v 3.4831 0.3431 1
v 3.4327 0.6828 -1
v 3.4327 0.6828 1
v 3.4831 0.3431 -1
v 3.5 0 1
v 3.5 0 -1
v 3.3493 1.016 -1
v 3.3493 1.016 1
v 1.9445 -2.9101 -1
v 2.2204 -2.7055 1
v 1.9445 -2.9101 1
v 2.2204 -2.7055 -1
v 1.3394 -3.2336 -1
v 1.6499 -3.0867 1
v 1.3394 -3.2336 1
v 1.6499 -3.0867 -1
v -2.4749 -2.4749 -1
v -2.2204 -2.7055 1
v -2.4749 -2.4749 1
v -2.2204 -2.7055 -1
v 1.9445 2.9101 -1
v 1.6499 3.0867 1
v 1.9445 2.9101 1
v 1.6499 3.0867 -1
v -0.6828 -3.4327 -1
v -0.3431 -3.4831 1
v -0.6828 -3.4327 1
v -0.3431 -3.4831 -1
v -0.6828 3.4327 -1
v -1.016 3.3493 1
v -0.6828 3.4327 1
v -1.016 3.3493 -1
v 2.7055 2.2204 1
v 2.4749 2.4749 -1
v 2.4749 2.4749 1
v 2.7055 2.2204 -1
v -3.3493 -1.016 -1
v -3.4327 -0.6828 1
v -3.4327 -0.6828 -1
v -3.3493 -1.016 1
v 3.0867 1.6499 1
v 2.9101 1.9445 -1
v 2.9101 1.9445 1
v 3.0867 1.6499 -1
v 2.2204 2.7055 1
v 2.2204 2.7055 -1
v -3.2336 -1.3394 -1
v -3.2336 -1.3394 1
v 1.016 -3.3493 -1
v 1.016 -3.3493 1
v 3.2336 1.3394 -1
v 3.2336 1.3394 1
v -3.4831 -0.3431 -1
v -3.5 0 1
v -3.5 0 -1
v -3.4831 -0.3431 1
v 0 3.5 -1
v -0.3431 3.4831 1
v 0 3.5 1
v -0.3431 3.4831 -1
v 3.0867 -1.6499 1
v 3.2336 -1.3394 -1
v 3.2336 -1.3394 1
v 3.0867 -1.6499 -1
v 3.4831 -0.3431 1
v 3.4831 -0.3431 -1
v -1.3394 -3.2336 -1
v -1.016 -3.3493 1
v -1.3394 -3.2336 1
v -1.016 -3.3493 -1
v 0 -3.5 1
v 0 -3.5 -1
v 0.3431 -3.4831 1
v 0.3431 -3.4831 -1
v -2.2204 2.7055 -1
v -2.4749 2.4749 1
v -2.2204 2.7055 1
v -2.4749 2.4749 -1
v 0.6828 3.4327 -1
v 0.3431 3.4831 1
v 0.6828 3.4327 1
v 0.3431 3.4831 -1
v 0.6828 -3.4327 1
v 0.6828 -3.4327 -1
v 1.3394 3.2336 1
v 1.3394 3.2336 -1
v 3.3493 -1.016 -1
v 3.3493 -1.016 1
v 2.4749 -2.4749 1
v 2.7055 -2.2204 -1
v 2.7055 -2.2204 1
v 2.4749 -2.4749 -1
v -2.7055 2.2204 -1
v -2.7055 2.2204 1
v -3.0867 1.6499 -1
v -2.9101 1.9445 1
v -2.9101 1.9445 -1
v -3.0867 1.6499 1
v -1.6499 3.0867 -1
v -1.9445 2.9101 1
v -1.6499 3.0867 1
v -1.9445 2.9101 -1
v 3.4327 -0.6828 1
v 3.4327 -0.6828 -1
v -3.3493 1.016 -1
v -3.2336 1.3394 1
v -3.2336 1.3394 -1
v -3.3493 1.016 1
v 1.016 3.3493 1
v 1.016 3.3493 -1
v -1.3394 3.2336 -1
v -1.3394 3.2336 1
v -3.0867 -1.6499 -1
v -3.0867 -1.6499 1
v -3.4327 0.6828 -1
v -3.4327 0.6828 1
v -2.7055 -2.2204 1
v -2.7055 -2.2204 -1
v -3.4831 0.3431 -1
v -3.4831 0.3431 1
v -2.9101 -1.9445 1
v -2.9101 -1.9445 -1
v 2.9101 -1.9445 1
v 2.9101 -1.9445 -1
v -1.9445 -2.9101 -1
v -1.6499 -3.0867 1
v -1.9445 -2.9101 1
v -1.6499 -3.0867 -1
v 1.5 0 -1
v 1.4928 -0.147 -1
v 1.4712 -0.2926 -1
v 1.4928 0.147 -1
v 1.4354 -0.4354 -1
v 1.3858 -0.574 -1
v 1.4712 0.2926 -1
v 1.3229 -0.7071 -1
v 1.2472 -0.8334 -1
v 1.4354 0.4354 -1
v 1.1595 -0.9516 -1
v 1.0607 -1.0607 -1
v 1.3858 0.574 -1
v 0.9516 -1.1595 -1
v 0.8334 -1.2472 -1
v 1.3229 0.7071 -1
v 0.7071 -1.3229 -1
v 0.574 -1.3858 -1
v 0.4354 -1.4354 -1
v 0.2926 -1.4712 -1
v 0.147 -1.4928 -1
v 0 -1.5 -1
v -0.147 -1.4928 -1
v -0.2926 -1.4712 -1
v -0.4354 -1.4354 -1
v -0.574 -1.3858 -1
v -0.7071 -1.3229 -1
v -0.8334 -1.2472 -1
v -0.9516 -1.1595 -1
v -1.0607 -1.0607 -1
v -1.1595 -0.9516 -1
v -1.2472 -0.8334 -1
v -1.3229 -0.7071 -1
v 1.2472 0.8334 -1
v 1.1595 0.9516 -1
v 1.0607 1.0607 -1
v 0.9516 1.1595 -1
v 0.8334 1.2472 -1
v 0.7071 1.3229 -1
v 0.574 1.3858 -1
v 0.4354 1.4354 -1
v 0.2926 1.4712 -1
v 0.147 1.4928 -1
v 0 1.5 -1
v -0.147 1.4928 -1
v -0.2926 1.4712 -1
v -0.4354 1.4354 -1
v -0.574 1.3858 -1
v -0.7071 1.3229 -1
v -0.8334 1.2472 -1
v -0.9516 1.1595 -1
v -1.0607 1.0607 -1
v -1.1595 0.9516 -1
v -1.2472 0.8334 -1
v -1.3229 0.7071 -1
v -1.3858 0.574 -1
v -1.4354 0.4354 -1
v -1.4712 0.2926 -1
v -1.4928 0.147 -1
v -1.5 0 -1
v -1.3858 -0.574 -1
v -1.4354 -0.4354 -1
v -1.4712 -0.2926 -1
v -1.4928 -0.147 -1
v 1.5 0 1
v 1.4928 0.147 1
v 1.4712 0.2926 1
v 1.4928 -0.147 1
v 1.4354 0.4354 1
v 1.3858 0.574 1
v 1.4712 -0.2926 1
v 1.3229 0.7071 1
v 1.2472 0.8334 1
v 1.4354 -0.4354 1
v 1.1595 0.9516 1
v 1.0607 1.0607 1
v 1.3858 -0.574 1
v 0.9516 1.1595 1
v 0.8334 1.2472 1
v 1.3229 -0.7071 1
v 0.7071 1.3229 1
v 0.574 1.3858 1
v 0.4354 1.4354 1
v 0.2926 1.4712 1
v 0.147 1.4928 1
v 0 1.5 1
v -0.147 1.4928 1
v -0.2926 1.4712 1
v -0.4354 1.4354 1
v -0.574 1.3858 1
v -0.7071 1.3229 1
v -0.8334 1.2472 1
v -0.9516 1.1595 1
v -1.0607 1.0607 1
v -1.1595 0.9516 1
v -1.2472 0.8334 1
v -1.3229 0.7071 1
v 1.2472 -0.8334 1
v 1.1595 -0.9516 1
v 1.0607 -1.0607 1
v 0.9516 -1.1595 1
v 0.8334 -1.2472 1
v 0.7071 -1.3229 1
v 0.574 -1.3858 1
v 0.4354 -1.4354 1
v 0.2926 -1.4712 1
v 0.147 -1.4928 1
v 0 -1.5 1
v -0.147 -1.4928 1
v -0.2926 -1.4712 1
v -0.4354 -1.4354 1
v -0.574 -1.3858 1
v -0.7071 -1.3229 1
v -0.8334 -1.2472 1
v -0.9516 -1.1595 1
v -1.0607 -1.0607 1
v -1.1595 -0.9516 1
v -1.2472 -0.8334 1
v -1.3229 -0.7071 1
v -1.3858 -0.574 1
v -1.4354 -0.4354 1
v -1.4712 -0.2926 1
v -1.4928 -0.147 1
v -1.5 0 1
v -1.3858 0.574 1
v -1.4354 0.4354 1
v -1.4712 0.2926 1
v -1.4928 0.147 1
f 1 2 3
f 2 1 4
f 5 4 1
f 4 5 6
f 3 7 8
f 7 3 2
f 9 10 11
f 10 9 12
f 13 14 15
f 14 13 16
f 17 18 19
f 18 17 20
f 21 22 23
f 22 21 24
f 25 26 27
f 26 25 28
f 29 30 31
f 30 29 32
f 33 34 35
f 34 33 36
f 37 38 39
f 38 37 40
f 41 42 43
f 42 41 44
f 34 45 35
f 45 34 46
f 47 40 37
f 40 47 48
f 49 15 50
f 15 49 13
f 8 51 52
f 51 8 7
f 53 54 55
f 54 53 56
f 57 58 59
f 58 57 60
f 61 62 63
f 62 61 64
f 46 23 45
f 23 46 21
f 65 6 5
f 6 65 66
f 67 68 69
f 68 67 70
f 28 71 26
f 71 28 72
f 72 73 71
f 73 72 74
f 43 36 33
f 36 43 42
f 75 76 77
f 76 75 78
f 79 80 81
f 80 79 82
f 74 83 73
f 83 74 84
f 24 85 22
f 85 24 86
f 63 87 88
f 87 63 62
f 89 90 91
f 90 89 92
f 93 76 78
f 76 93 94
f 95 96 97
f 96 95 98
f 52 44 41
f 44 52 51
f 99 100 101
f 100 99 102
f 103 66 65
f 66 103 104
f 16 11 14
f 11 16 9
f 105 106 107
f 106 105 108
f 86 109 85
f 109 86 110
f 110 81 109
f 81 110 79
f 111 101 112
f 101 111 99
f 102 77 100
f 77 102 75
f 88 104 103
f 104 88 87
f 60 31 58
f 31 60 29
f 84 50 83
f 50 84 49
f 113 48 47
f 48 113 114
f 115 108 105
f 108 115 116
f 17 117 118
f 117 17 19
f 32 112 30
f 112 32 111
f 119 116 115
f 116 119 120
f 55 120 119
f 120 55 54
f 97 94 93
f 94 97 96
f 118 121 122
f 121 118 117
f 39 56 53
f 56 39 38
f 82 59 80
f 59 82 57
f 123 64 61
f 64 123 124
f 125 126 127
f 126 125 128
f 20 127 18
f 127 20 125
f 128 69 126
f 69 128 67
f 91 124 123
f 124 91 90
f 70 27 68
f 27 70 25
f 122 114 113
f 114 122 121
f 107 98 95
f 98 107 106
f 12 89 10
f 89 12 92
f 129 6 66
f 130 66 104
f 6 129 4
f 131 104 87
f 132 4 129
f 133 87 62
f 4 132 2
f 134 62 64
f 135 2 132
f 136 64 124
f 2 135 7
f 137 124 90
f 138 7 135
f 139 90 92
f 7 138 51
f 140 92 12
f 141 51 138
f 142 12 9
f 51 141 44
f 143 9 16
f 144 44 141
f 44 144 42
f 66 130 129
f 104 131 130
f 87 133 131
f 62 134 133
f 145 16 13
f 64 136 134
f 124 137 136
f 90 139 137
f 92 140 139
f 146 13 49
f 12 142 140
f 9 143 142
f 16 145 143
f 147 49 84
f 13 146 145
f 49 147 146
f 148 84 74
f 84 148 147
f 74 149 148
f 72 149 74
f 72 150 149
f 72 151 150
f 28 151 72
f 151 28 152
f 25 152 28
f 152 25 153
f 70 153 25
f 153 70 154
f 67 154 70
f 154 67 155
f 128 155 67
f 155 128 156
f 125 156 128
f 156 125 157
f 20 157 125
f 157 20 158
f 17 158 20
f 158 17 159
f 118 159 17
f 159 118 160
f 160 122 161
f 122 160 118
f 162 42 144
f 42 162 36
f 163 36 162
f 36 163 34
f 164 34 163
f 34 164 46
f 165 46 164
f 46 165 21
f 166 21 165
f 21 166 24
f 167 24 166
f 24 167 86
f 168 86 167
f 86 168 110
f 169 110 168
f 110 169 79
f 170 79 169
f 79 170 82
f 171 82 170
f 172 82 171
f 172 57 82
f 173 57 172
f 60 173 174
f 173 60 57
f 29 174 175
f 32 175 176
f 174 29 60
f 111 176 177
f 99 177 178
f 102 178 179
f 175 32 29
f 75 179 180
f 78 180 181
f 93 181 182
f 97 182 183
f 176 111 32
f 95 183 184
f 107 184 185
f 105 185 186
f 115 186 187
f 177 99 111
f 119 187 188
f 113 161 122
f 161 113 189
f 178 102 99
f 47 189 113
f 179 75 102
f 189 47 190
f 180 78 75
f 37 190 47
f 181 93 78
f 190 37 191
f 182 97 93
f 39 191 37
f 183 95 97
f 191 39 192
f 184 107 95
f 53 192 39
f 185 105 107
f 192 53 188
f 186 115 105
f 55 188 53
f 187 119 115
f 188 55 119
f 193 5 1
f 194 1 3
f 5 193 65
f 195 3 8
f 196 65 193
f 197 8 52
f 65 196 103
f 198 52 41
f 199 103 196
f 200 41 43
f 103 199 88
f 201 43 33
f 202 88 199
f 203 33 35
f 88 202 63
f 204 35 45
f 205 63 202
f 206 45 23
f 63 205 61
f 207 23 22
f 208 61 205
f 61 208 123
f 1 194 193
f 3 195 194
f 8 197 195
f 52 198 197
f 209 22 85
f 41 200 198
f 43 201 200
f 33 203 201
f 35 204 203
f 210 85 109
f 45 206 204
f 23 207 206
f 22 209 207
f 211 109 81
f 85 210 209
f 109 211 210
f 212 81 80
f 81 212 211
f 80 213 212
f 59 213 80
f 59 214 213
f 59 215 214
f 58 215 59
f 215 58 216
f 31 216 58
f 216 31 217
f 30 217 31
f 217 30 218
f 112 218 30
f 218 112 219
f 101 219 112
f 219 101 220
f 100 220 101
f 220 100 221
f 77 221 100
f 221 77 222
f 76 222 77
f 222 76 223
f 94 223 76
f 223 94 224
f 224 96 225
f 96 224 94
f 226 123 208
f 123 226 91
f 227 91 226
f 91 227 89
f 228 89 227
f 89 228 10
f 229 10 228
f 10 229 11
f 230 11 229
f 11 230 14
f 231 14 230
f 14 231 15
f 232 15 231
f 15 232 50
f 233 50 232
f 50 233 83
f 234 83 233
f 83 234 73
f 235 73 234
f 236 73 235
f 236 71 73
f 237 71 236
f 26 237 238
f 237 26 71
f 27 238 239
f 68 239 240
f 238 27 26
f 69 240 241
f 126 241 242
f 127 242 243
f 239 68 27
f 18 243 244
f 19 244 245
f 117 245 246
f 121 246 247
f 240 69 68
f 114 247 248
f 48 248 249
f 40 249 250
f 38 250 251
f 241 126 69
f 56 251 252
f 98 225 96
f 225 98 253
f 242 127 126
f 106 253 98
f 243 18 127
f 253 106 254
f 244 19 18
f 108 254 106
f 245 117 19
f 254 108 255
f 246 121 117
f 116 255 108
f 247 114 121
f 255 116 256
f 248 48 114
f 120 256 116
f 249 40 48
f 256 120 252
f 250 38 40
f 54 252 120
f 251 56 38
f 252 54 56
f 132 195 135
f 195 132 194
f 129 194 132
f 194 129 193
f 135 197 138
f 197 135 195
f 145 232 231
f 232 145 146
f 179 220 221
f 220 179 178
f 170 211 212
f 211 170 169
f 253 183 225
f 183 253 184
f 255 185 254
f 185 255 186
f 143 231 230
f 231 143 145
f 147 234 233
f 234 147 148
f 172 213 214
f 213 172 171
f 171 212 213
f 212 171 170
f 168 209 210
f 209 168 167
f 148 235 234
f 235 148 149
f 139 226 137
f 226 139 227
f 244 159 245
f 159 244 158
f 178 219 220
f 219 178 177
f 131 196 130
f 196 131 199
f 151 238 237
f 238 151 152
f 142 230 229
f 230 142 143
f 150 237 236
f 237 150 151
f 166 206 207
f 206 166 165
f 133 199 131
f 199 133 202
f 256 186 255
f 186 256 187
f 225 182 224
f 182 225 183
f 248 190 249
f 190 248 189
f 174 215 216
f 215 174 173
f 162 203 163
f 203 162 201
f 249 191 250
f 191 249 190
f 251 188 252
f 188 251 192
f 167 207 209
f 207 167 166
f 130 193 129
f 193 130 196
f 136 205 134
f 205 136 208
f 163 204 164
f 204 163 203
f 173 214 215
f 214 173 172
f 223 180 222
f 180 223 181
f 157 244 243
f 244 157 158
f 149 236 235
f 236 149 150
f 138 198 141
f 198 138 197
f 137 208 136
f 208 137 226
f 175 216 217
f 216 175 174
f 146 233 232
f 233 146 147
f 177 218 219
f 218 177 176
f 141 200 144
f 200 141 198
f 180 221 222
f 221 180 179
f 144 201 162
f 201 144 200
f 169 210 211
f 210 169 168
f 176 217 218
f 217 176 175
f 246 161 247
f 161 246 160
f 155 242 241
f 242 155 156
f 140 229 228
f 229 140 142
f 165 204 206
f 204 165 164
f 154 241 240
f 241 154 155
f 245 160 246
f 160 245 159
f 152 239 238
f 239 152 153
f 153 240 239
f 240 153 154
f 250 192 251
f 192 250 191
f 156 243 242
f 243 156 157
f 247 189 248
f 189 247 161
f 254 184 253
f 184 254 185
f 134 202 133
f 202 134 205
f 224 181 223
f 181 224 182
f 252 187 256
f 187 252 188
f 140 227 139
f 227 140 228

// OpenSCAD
// file: config.scad
// Ancooper delta 3D printer

// Configuration

anc_epsilon = 1.01;
$fn = 64;
// main file
// Ancooper delta 3D printer

include <config.scad>;

// Functions

module anc_rcube(v, r, center = false){
	if(center){
		minkowski(){
			cube([v[0]-2*r, v[1]-2*r, 0.5*v[2]], center = true);
			cylinder(h = 0.5*v[2], r = r, center = true);
		}
	}else{
		translate([r, r, 0]) minkowski(){
			cube([v[0]-2*r, v[1]-2*r, 0.5*v[2]]);
			cylinder(h = 0.5*v[2], r = r);
		}
	}
}

module anc_rail(length, width, hwidth, height, hheight){
	cyl_width = width-hwidth;
	cyl_height = 0.5*(0.5*height-hheight);
	cyl_radius = max(anc_epsilon, max(cyl_width, cyl_height));
	difference(){
		color(anc_co_color) cube([length, width, height], center = true);
		color(anc_co_color_diff) hull(){
			translate([0, 0.5*width, +cyl_height]) scale([1, cyl_width/cyl_radius, cyl_height/cyl_radius]) rotate([0, 90, 0]) cylinder(h = length*anc_epsilon, r = cyl_radius, center = true);
			translate([0, 0.5*width, -cyl_height]) scale([1, cyl_width/cyl_radius, cyl_height/cyl_radius]) rotate([0, 90, 0]) cylinder(h = length*anc_epsilon, r = cyl_radius, center = true);
		}
	}
}

module anc_bearing(d1, d2, w, center = false){
	difference(){
		cylinder(h = w, r = 0.5*d1, center = center);
		translate([0, 0, -0.25*w*(anc_epsilon-1)]) cylinder(h = w*anc_epsilon, r = 0.5*d2, center = center);
	}
}

module anc_bearing_7x3x2(color = "LightSlateGray"){
	color(color) anc_bearing(7, 3, 2, center = true);
}

// End

//anc_rcube([20, 20, 5], r = 5, center = true);
//anc_rail(25, 5, 2, 12, 1);
//anc_bearing(2, 3.5, 1.5);
anc_bearing_7x3x2();
